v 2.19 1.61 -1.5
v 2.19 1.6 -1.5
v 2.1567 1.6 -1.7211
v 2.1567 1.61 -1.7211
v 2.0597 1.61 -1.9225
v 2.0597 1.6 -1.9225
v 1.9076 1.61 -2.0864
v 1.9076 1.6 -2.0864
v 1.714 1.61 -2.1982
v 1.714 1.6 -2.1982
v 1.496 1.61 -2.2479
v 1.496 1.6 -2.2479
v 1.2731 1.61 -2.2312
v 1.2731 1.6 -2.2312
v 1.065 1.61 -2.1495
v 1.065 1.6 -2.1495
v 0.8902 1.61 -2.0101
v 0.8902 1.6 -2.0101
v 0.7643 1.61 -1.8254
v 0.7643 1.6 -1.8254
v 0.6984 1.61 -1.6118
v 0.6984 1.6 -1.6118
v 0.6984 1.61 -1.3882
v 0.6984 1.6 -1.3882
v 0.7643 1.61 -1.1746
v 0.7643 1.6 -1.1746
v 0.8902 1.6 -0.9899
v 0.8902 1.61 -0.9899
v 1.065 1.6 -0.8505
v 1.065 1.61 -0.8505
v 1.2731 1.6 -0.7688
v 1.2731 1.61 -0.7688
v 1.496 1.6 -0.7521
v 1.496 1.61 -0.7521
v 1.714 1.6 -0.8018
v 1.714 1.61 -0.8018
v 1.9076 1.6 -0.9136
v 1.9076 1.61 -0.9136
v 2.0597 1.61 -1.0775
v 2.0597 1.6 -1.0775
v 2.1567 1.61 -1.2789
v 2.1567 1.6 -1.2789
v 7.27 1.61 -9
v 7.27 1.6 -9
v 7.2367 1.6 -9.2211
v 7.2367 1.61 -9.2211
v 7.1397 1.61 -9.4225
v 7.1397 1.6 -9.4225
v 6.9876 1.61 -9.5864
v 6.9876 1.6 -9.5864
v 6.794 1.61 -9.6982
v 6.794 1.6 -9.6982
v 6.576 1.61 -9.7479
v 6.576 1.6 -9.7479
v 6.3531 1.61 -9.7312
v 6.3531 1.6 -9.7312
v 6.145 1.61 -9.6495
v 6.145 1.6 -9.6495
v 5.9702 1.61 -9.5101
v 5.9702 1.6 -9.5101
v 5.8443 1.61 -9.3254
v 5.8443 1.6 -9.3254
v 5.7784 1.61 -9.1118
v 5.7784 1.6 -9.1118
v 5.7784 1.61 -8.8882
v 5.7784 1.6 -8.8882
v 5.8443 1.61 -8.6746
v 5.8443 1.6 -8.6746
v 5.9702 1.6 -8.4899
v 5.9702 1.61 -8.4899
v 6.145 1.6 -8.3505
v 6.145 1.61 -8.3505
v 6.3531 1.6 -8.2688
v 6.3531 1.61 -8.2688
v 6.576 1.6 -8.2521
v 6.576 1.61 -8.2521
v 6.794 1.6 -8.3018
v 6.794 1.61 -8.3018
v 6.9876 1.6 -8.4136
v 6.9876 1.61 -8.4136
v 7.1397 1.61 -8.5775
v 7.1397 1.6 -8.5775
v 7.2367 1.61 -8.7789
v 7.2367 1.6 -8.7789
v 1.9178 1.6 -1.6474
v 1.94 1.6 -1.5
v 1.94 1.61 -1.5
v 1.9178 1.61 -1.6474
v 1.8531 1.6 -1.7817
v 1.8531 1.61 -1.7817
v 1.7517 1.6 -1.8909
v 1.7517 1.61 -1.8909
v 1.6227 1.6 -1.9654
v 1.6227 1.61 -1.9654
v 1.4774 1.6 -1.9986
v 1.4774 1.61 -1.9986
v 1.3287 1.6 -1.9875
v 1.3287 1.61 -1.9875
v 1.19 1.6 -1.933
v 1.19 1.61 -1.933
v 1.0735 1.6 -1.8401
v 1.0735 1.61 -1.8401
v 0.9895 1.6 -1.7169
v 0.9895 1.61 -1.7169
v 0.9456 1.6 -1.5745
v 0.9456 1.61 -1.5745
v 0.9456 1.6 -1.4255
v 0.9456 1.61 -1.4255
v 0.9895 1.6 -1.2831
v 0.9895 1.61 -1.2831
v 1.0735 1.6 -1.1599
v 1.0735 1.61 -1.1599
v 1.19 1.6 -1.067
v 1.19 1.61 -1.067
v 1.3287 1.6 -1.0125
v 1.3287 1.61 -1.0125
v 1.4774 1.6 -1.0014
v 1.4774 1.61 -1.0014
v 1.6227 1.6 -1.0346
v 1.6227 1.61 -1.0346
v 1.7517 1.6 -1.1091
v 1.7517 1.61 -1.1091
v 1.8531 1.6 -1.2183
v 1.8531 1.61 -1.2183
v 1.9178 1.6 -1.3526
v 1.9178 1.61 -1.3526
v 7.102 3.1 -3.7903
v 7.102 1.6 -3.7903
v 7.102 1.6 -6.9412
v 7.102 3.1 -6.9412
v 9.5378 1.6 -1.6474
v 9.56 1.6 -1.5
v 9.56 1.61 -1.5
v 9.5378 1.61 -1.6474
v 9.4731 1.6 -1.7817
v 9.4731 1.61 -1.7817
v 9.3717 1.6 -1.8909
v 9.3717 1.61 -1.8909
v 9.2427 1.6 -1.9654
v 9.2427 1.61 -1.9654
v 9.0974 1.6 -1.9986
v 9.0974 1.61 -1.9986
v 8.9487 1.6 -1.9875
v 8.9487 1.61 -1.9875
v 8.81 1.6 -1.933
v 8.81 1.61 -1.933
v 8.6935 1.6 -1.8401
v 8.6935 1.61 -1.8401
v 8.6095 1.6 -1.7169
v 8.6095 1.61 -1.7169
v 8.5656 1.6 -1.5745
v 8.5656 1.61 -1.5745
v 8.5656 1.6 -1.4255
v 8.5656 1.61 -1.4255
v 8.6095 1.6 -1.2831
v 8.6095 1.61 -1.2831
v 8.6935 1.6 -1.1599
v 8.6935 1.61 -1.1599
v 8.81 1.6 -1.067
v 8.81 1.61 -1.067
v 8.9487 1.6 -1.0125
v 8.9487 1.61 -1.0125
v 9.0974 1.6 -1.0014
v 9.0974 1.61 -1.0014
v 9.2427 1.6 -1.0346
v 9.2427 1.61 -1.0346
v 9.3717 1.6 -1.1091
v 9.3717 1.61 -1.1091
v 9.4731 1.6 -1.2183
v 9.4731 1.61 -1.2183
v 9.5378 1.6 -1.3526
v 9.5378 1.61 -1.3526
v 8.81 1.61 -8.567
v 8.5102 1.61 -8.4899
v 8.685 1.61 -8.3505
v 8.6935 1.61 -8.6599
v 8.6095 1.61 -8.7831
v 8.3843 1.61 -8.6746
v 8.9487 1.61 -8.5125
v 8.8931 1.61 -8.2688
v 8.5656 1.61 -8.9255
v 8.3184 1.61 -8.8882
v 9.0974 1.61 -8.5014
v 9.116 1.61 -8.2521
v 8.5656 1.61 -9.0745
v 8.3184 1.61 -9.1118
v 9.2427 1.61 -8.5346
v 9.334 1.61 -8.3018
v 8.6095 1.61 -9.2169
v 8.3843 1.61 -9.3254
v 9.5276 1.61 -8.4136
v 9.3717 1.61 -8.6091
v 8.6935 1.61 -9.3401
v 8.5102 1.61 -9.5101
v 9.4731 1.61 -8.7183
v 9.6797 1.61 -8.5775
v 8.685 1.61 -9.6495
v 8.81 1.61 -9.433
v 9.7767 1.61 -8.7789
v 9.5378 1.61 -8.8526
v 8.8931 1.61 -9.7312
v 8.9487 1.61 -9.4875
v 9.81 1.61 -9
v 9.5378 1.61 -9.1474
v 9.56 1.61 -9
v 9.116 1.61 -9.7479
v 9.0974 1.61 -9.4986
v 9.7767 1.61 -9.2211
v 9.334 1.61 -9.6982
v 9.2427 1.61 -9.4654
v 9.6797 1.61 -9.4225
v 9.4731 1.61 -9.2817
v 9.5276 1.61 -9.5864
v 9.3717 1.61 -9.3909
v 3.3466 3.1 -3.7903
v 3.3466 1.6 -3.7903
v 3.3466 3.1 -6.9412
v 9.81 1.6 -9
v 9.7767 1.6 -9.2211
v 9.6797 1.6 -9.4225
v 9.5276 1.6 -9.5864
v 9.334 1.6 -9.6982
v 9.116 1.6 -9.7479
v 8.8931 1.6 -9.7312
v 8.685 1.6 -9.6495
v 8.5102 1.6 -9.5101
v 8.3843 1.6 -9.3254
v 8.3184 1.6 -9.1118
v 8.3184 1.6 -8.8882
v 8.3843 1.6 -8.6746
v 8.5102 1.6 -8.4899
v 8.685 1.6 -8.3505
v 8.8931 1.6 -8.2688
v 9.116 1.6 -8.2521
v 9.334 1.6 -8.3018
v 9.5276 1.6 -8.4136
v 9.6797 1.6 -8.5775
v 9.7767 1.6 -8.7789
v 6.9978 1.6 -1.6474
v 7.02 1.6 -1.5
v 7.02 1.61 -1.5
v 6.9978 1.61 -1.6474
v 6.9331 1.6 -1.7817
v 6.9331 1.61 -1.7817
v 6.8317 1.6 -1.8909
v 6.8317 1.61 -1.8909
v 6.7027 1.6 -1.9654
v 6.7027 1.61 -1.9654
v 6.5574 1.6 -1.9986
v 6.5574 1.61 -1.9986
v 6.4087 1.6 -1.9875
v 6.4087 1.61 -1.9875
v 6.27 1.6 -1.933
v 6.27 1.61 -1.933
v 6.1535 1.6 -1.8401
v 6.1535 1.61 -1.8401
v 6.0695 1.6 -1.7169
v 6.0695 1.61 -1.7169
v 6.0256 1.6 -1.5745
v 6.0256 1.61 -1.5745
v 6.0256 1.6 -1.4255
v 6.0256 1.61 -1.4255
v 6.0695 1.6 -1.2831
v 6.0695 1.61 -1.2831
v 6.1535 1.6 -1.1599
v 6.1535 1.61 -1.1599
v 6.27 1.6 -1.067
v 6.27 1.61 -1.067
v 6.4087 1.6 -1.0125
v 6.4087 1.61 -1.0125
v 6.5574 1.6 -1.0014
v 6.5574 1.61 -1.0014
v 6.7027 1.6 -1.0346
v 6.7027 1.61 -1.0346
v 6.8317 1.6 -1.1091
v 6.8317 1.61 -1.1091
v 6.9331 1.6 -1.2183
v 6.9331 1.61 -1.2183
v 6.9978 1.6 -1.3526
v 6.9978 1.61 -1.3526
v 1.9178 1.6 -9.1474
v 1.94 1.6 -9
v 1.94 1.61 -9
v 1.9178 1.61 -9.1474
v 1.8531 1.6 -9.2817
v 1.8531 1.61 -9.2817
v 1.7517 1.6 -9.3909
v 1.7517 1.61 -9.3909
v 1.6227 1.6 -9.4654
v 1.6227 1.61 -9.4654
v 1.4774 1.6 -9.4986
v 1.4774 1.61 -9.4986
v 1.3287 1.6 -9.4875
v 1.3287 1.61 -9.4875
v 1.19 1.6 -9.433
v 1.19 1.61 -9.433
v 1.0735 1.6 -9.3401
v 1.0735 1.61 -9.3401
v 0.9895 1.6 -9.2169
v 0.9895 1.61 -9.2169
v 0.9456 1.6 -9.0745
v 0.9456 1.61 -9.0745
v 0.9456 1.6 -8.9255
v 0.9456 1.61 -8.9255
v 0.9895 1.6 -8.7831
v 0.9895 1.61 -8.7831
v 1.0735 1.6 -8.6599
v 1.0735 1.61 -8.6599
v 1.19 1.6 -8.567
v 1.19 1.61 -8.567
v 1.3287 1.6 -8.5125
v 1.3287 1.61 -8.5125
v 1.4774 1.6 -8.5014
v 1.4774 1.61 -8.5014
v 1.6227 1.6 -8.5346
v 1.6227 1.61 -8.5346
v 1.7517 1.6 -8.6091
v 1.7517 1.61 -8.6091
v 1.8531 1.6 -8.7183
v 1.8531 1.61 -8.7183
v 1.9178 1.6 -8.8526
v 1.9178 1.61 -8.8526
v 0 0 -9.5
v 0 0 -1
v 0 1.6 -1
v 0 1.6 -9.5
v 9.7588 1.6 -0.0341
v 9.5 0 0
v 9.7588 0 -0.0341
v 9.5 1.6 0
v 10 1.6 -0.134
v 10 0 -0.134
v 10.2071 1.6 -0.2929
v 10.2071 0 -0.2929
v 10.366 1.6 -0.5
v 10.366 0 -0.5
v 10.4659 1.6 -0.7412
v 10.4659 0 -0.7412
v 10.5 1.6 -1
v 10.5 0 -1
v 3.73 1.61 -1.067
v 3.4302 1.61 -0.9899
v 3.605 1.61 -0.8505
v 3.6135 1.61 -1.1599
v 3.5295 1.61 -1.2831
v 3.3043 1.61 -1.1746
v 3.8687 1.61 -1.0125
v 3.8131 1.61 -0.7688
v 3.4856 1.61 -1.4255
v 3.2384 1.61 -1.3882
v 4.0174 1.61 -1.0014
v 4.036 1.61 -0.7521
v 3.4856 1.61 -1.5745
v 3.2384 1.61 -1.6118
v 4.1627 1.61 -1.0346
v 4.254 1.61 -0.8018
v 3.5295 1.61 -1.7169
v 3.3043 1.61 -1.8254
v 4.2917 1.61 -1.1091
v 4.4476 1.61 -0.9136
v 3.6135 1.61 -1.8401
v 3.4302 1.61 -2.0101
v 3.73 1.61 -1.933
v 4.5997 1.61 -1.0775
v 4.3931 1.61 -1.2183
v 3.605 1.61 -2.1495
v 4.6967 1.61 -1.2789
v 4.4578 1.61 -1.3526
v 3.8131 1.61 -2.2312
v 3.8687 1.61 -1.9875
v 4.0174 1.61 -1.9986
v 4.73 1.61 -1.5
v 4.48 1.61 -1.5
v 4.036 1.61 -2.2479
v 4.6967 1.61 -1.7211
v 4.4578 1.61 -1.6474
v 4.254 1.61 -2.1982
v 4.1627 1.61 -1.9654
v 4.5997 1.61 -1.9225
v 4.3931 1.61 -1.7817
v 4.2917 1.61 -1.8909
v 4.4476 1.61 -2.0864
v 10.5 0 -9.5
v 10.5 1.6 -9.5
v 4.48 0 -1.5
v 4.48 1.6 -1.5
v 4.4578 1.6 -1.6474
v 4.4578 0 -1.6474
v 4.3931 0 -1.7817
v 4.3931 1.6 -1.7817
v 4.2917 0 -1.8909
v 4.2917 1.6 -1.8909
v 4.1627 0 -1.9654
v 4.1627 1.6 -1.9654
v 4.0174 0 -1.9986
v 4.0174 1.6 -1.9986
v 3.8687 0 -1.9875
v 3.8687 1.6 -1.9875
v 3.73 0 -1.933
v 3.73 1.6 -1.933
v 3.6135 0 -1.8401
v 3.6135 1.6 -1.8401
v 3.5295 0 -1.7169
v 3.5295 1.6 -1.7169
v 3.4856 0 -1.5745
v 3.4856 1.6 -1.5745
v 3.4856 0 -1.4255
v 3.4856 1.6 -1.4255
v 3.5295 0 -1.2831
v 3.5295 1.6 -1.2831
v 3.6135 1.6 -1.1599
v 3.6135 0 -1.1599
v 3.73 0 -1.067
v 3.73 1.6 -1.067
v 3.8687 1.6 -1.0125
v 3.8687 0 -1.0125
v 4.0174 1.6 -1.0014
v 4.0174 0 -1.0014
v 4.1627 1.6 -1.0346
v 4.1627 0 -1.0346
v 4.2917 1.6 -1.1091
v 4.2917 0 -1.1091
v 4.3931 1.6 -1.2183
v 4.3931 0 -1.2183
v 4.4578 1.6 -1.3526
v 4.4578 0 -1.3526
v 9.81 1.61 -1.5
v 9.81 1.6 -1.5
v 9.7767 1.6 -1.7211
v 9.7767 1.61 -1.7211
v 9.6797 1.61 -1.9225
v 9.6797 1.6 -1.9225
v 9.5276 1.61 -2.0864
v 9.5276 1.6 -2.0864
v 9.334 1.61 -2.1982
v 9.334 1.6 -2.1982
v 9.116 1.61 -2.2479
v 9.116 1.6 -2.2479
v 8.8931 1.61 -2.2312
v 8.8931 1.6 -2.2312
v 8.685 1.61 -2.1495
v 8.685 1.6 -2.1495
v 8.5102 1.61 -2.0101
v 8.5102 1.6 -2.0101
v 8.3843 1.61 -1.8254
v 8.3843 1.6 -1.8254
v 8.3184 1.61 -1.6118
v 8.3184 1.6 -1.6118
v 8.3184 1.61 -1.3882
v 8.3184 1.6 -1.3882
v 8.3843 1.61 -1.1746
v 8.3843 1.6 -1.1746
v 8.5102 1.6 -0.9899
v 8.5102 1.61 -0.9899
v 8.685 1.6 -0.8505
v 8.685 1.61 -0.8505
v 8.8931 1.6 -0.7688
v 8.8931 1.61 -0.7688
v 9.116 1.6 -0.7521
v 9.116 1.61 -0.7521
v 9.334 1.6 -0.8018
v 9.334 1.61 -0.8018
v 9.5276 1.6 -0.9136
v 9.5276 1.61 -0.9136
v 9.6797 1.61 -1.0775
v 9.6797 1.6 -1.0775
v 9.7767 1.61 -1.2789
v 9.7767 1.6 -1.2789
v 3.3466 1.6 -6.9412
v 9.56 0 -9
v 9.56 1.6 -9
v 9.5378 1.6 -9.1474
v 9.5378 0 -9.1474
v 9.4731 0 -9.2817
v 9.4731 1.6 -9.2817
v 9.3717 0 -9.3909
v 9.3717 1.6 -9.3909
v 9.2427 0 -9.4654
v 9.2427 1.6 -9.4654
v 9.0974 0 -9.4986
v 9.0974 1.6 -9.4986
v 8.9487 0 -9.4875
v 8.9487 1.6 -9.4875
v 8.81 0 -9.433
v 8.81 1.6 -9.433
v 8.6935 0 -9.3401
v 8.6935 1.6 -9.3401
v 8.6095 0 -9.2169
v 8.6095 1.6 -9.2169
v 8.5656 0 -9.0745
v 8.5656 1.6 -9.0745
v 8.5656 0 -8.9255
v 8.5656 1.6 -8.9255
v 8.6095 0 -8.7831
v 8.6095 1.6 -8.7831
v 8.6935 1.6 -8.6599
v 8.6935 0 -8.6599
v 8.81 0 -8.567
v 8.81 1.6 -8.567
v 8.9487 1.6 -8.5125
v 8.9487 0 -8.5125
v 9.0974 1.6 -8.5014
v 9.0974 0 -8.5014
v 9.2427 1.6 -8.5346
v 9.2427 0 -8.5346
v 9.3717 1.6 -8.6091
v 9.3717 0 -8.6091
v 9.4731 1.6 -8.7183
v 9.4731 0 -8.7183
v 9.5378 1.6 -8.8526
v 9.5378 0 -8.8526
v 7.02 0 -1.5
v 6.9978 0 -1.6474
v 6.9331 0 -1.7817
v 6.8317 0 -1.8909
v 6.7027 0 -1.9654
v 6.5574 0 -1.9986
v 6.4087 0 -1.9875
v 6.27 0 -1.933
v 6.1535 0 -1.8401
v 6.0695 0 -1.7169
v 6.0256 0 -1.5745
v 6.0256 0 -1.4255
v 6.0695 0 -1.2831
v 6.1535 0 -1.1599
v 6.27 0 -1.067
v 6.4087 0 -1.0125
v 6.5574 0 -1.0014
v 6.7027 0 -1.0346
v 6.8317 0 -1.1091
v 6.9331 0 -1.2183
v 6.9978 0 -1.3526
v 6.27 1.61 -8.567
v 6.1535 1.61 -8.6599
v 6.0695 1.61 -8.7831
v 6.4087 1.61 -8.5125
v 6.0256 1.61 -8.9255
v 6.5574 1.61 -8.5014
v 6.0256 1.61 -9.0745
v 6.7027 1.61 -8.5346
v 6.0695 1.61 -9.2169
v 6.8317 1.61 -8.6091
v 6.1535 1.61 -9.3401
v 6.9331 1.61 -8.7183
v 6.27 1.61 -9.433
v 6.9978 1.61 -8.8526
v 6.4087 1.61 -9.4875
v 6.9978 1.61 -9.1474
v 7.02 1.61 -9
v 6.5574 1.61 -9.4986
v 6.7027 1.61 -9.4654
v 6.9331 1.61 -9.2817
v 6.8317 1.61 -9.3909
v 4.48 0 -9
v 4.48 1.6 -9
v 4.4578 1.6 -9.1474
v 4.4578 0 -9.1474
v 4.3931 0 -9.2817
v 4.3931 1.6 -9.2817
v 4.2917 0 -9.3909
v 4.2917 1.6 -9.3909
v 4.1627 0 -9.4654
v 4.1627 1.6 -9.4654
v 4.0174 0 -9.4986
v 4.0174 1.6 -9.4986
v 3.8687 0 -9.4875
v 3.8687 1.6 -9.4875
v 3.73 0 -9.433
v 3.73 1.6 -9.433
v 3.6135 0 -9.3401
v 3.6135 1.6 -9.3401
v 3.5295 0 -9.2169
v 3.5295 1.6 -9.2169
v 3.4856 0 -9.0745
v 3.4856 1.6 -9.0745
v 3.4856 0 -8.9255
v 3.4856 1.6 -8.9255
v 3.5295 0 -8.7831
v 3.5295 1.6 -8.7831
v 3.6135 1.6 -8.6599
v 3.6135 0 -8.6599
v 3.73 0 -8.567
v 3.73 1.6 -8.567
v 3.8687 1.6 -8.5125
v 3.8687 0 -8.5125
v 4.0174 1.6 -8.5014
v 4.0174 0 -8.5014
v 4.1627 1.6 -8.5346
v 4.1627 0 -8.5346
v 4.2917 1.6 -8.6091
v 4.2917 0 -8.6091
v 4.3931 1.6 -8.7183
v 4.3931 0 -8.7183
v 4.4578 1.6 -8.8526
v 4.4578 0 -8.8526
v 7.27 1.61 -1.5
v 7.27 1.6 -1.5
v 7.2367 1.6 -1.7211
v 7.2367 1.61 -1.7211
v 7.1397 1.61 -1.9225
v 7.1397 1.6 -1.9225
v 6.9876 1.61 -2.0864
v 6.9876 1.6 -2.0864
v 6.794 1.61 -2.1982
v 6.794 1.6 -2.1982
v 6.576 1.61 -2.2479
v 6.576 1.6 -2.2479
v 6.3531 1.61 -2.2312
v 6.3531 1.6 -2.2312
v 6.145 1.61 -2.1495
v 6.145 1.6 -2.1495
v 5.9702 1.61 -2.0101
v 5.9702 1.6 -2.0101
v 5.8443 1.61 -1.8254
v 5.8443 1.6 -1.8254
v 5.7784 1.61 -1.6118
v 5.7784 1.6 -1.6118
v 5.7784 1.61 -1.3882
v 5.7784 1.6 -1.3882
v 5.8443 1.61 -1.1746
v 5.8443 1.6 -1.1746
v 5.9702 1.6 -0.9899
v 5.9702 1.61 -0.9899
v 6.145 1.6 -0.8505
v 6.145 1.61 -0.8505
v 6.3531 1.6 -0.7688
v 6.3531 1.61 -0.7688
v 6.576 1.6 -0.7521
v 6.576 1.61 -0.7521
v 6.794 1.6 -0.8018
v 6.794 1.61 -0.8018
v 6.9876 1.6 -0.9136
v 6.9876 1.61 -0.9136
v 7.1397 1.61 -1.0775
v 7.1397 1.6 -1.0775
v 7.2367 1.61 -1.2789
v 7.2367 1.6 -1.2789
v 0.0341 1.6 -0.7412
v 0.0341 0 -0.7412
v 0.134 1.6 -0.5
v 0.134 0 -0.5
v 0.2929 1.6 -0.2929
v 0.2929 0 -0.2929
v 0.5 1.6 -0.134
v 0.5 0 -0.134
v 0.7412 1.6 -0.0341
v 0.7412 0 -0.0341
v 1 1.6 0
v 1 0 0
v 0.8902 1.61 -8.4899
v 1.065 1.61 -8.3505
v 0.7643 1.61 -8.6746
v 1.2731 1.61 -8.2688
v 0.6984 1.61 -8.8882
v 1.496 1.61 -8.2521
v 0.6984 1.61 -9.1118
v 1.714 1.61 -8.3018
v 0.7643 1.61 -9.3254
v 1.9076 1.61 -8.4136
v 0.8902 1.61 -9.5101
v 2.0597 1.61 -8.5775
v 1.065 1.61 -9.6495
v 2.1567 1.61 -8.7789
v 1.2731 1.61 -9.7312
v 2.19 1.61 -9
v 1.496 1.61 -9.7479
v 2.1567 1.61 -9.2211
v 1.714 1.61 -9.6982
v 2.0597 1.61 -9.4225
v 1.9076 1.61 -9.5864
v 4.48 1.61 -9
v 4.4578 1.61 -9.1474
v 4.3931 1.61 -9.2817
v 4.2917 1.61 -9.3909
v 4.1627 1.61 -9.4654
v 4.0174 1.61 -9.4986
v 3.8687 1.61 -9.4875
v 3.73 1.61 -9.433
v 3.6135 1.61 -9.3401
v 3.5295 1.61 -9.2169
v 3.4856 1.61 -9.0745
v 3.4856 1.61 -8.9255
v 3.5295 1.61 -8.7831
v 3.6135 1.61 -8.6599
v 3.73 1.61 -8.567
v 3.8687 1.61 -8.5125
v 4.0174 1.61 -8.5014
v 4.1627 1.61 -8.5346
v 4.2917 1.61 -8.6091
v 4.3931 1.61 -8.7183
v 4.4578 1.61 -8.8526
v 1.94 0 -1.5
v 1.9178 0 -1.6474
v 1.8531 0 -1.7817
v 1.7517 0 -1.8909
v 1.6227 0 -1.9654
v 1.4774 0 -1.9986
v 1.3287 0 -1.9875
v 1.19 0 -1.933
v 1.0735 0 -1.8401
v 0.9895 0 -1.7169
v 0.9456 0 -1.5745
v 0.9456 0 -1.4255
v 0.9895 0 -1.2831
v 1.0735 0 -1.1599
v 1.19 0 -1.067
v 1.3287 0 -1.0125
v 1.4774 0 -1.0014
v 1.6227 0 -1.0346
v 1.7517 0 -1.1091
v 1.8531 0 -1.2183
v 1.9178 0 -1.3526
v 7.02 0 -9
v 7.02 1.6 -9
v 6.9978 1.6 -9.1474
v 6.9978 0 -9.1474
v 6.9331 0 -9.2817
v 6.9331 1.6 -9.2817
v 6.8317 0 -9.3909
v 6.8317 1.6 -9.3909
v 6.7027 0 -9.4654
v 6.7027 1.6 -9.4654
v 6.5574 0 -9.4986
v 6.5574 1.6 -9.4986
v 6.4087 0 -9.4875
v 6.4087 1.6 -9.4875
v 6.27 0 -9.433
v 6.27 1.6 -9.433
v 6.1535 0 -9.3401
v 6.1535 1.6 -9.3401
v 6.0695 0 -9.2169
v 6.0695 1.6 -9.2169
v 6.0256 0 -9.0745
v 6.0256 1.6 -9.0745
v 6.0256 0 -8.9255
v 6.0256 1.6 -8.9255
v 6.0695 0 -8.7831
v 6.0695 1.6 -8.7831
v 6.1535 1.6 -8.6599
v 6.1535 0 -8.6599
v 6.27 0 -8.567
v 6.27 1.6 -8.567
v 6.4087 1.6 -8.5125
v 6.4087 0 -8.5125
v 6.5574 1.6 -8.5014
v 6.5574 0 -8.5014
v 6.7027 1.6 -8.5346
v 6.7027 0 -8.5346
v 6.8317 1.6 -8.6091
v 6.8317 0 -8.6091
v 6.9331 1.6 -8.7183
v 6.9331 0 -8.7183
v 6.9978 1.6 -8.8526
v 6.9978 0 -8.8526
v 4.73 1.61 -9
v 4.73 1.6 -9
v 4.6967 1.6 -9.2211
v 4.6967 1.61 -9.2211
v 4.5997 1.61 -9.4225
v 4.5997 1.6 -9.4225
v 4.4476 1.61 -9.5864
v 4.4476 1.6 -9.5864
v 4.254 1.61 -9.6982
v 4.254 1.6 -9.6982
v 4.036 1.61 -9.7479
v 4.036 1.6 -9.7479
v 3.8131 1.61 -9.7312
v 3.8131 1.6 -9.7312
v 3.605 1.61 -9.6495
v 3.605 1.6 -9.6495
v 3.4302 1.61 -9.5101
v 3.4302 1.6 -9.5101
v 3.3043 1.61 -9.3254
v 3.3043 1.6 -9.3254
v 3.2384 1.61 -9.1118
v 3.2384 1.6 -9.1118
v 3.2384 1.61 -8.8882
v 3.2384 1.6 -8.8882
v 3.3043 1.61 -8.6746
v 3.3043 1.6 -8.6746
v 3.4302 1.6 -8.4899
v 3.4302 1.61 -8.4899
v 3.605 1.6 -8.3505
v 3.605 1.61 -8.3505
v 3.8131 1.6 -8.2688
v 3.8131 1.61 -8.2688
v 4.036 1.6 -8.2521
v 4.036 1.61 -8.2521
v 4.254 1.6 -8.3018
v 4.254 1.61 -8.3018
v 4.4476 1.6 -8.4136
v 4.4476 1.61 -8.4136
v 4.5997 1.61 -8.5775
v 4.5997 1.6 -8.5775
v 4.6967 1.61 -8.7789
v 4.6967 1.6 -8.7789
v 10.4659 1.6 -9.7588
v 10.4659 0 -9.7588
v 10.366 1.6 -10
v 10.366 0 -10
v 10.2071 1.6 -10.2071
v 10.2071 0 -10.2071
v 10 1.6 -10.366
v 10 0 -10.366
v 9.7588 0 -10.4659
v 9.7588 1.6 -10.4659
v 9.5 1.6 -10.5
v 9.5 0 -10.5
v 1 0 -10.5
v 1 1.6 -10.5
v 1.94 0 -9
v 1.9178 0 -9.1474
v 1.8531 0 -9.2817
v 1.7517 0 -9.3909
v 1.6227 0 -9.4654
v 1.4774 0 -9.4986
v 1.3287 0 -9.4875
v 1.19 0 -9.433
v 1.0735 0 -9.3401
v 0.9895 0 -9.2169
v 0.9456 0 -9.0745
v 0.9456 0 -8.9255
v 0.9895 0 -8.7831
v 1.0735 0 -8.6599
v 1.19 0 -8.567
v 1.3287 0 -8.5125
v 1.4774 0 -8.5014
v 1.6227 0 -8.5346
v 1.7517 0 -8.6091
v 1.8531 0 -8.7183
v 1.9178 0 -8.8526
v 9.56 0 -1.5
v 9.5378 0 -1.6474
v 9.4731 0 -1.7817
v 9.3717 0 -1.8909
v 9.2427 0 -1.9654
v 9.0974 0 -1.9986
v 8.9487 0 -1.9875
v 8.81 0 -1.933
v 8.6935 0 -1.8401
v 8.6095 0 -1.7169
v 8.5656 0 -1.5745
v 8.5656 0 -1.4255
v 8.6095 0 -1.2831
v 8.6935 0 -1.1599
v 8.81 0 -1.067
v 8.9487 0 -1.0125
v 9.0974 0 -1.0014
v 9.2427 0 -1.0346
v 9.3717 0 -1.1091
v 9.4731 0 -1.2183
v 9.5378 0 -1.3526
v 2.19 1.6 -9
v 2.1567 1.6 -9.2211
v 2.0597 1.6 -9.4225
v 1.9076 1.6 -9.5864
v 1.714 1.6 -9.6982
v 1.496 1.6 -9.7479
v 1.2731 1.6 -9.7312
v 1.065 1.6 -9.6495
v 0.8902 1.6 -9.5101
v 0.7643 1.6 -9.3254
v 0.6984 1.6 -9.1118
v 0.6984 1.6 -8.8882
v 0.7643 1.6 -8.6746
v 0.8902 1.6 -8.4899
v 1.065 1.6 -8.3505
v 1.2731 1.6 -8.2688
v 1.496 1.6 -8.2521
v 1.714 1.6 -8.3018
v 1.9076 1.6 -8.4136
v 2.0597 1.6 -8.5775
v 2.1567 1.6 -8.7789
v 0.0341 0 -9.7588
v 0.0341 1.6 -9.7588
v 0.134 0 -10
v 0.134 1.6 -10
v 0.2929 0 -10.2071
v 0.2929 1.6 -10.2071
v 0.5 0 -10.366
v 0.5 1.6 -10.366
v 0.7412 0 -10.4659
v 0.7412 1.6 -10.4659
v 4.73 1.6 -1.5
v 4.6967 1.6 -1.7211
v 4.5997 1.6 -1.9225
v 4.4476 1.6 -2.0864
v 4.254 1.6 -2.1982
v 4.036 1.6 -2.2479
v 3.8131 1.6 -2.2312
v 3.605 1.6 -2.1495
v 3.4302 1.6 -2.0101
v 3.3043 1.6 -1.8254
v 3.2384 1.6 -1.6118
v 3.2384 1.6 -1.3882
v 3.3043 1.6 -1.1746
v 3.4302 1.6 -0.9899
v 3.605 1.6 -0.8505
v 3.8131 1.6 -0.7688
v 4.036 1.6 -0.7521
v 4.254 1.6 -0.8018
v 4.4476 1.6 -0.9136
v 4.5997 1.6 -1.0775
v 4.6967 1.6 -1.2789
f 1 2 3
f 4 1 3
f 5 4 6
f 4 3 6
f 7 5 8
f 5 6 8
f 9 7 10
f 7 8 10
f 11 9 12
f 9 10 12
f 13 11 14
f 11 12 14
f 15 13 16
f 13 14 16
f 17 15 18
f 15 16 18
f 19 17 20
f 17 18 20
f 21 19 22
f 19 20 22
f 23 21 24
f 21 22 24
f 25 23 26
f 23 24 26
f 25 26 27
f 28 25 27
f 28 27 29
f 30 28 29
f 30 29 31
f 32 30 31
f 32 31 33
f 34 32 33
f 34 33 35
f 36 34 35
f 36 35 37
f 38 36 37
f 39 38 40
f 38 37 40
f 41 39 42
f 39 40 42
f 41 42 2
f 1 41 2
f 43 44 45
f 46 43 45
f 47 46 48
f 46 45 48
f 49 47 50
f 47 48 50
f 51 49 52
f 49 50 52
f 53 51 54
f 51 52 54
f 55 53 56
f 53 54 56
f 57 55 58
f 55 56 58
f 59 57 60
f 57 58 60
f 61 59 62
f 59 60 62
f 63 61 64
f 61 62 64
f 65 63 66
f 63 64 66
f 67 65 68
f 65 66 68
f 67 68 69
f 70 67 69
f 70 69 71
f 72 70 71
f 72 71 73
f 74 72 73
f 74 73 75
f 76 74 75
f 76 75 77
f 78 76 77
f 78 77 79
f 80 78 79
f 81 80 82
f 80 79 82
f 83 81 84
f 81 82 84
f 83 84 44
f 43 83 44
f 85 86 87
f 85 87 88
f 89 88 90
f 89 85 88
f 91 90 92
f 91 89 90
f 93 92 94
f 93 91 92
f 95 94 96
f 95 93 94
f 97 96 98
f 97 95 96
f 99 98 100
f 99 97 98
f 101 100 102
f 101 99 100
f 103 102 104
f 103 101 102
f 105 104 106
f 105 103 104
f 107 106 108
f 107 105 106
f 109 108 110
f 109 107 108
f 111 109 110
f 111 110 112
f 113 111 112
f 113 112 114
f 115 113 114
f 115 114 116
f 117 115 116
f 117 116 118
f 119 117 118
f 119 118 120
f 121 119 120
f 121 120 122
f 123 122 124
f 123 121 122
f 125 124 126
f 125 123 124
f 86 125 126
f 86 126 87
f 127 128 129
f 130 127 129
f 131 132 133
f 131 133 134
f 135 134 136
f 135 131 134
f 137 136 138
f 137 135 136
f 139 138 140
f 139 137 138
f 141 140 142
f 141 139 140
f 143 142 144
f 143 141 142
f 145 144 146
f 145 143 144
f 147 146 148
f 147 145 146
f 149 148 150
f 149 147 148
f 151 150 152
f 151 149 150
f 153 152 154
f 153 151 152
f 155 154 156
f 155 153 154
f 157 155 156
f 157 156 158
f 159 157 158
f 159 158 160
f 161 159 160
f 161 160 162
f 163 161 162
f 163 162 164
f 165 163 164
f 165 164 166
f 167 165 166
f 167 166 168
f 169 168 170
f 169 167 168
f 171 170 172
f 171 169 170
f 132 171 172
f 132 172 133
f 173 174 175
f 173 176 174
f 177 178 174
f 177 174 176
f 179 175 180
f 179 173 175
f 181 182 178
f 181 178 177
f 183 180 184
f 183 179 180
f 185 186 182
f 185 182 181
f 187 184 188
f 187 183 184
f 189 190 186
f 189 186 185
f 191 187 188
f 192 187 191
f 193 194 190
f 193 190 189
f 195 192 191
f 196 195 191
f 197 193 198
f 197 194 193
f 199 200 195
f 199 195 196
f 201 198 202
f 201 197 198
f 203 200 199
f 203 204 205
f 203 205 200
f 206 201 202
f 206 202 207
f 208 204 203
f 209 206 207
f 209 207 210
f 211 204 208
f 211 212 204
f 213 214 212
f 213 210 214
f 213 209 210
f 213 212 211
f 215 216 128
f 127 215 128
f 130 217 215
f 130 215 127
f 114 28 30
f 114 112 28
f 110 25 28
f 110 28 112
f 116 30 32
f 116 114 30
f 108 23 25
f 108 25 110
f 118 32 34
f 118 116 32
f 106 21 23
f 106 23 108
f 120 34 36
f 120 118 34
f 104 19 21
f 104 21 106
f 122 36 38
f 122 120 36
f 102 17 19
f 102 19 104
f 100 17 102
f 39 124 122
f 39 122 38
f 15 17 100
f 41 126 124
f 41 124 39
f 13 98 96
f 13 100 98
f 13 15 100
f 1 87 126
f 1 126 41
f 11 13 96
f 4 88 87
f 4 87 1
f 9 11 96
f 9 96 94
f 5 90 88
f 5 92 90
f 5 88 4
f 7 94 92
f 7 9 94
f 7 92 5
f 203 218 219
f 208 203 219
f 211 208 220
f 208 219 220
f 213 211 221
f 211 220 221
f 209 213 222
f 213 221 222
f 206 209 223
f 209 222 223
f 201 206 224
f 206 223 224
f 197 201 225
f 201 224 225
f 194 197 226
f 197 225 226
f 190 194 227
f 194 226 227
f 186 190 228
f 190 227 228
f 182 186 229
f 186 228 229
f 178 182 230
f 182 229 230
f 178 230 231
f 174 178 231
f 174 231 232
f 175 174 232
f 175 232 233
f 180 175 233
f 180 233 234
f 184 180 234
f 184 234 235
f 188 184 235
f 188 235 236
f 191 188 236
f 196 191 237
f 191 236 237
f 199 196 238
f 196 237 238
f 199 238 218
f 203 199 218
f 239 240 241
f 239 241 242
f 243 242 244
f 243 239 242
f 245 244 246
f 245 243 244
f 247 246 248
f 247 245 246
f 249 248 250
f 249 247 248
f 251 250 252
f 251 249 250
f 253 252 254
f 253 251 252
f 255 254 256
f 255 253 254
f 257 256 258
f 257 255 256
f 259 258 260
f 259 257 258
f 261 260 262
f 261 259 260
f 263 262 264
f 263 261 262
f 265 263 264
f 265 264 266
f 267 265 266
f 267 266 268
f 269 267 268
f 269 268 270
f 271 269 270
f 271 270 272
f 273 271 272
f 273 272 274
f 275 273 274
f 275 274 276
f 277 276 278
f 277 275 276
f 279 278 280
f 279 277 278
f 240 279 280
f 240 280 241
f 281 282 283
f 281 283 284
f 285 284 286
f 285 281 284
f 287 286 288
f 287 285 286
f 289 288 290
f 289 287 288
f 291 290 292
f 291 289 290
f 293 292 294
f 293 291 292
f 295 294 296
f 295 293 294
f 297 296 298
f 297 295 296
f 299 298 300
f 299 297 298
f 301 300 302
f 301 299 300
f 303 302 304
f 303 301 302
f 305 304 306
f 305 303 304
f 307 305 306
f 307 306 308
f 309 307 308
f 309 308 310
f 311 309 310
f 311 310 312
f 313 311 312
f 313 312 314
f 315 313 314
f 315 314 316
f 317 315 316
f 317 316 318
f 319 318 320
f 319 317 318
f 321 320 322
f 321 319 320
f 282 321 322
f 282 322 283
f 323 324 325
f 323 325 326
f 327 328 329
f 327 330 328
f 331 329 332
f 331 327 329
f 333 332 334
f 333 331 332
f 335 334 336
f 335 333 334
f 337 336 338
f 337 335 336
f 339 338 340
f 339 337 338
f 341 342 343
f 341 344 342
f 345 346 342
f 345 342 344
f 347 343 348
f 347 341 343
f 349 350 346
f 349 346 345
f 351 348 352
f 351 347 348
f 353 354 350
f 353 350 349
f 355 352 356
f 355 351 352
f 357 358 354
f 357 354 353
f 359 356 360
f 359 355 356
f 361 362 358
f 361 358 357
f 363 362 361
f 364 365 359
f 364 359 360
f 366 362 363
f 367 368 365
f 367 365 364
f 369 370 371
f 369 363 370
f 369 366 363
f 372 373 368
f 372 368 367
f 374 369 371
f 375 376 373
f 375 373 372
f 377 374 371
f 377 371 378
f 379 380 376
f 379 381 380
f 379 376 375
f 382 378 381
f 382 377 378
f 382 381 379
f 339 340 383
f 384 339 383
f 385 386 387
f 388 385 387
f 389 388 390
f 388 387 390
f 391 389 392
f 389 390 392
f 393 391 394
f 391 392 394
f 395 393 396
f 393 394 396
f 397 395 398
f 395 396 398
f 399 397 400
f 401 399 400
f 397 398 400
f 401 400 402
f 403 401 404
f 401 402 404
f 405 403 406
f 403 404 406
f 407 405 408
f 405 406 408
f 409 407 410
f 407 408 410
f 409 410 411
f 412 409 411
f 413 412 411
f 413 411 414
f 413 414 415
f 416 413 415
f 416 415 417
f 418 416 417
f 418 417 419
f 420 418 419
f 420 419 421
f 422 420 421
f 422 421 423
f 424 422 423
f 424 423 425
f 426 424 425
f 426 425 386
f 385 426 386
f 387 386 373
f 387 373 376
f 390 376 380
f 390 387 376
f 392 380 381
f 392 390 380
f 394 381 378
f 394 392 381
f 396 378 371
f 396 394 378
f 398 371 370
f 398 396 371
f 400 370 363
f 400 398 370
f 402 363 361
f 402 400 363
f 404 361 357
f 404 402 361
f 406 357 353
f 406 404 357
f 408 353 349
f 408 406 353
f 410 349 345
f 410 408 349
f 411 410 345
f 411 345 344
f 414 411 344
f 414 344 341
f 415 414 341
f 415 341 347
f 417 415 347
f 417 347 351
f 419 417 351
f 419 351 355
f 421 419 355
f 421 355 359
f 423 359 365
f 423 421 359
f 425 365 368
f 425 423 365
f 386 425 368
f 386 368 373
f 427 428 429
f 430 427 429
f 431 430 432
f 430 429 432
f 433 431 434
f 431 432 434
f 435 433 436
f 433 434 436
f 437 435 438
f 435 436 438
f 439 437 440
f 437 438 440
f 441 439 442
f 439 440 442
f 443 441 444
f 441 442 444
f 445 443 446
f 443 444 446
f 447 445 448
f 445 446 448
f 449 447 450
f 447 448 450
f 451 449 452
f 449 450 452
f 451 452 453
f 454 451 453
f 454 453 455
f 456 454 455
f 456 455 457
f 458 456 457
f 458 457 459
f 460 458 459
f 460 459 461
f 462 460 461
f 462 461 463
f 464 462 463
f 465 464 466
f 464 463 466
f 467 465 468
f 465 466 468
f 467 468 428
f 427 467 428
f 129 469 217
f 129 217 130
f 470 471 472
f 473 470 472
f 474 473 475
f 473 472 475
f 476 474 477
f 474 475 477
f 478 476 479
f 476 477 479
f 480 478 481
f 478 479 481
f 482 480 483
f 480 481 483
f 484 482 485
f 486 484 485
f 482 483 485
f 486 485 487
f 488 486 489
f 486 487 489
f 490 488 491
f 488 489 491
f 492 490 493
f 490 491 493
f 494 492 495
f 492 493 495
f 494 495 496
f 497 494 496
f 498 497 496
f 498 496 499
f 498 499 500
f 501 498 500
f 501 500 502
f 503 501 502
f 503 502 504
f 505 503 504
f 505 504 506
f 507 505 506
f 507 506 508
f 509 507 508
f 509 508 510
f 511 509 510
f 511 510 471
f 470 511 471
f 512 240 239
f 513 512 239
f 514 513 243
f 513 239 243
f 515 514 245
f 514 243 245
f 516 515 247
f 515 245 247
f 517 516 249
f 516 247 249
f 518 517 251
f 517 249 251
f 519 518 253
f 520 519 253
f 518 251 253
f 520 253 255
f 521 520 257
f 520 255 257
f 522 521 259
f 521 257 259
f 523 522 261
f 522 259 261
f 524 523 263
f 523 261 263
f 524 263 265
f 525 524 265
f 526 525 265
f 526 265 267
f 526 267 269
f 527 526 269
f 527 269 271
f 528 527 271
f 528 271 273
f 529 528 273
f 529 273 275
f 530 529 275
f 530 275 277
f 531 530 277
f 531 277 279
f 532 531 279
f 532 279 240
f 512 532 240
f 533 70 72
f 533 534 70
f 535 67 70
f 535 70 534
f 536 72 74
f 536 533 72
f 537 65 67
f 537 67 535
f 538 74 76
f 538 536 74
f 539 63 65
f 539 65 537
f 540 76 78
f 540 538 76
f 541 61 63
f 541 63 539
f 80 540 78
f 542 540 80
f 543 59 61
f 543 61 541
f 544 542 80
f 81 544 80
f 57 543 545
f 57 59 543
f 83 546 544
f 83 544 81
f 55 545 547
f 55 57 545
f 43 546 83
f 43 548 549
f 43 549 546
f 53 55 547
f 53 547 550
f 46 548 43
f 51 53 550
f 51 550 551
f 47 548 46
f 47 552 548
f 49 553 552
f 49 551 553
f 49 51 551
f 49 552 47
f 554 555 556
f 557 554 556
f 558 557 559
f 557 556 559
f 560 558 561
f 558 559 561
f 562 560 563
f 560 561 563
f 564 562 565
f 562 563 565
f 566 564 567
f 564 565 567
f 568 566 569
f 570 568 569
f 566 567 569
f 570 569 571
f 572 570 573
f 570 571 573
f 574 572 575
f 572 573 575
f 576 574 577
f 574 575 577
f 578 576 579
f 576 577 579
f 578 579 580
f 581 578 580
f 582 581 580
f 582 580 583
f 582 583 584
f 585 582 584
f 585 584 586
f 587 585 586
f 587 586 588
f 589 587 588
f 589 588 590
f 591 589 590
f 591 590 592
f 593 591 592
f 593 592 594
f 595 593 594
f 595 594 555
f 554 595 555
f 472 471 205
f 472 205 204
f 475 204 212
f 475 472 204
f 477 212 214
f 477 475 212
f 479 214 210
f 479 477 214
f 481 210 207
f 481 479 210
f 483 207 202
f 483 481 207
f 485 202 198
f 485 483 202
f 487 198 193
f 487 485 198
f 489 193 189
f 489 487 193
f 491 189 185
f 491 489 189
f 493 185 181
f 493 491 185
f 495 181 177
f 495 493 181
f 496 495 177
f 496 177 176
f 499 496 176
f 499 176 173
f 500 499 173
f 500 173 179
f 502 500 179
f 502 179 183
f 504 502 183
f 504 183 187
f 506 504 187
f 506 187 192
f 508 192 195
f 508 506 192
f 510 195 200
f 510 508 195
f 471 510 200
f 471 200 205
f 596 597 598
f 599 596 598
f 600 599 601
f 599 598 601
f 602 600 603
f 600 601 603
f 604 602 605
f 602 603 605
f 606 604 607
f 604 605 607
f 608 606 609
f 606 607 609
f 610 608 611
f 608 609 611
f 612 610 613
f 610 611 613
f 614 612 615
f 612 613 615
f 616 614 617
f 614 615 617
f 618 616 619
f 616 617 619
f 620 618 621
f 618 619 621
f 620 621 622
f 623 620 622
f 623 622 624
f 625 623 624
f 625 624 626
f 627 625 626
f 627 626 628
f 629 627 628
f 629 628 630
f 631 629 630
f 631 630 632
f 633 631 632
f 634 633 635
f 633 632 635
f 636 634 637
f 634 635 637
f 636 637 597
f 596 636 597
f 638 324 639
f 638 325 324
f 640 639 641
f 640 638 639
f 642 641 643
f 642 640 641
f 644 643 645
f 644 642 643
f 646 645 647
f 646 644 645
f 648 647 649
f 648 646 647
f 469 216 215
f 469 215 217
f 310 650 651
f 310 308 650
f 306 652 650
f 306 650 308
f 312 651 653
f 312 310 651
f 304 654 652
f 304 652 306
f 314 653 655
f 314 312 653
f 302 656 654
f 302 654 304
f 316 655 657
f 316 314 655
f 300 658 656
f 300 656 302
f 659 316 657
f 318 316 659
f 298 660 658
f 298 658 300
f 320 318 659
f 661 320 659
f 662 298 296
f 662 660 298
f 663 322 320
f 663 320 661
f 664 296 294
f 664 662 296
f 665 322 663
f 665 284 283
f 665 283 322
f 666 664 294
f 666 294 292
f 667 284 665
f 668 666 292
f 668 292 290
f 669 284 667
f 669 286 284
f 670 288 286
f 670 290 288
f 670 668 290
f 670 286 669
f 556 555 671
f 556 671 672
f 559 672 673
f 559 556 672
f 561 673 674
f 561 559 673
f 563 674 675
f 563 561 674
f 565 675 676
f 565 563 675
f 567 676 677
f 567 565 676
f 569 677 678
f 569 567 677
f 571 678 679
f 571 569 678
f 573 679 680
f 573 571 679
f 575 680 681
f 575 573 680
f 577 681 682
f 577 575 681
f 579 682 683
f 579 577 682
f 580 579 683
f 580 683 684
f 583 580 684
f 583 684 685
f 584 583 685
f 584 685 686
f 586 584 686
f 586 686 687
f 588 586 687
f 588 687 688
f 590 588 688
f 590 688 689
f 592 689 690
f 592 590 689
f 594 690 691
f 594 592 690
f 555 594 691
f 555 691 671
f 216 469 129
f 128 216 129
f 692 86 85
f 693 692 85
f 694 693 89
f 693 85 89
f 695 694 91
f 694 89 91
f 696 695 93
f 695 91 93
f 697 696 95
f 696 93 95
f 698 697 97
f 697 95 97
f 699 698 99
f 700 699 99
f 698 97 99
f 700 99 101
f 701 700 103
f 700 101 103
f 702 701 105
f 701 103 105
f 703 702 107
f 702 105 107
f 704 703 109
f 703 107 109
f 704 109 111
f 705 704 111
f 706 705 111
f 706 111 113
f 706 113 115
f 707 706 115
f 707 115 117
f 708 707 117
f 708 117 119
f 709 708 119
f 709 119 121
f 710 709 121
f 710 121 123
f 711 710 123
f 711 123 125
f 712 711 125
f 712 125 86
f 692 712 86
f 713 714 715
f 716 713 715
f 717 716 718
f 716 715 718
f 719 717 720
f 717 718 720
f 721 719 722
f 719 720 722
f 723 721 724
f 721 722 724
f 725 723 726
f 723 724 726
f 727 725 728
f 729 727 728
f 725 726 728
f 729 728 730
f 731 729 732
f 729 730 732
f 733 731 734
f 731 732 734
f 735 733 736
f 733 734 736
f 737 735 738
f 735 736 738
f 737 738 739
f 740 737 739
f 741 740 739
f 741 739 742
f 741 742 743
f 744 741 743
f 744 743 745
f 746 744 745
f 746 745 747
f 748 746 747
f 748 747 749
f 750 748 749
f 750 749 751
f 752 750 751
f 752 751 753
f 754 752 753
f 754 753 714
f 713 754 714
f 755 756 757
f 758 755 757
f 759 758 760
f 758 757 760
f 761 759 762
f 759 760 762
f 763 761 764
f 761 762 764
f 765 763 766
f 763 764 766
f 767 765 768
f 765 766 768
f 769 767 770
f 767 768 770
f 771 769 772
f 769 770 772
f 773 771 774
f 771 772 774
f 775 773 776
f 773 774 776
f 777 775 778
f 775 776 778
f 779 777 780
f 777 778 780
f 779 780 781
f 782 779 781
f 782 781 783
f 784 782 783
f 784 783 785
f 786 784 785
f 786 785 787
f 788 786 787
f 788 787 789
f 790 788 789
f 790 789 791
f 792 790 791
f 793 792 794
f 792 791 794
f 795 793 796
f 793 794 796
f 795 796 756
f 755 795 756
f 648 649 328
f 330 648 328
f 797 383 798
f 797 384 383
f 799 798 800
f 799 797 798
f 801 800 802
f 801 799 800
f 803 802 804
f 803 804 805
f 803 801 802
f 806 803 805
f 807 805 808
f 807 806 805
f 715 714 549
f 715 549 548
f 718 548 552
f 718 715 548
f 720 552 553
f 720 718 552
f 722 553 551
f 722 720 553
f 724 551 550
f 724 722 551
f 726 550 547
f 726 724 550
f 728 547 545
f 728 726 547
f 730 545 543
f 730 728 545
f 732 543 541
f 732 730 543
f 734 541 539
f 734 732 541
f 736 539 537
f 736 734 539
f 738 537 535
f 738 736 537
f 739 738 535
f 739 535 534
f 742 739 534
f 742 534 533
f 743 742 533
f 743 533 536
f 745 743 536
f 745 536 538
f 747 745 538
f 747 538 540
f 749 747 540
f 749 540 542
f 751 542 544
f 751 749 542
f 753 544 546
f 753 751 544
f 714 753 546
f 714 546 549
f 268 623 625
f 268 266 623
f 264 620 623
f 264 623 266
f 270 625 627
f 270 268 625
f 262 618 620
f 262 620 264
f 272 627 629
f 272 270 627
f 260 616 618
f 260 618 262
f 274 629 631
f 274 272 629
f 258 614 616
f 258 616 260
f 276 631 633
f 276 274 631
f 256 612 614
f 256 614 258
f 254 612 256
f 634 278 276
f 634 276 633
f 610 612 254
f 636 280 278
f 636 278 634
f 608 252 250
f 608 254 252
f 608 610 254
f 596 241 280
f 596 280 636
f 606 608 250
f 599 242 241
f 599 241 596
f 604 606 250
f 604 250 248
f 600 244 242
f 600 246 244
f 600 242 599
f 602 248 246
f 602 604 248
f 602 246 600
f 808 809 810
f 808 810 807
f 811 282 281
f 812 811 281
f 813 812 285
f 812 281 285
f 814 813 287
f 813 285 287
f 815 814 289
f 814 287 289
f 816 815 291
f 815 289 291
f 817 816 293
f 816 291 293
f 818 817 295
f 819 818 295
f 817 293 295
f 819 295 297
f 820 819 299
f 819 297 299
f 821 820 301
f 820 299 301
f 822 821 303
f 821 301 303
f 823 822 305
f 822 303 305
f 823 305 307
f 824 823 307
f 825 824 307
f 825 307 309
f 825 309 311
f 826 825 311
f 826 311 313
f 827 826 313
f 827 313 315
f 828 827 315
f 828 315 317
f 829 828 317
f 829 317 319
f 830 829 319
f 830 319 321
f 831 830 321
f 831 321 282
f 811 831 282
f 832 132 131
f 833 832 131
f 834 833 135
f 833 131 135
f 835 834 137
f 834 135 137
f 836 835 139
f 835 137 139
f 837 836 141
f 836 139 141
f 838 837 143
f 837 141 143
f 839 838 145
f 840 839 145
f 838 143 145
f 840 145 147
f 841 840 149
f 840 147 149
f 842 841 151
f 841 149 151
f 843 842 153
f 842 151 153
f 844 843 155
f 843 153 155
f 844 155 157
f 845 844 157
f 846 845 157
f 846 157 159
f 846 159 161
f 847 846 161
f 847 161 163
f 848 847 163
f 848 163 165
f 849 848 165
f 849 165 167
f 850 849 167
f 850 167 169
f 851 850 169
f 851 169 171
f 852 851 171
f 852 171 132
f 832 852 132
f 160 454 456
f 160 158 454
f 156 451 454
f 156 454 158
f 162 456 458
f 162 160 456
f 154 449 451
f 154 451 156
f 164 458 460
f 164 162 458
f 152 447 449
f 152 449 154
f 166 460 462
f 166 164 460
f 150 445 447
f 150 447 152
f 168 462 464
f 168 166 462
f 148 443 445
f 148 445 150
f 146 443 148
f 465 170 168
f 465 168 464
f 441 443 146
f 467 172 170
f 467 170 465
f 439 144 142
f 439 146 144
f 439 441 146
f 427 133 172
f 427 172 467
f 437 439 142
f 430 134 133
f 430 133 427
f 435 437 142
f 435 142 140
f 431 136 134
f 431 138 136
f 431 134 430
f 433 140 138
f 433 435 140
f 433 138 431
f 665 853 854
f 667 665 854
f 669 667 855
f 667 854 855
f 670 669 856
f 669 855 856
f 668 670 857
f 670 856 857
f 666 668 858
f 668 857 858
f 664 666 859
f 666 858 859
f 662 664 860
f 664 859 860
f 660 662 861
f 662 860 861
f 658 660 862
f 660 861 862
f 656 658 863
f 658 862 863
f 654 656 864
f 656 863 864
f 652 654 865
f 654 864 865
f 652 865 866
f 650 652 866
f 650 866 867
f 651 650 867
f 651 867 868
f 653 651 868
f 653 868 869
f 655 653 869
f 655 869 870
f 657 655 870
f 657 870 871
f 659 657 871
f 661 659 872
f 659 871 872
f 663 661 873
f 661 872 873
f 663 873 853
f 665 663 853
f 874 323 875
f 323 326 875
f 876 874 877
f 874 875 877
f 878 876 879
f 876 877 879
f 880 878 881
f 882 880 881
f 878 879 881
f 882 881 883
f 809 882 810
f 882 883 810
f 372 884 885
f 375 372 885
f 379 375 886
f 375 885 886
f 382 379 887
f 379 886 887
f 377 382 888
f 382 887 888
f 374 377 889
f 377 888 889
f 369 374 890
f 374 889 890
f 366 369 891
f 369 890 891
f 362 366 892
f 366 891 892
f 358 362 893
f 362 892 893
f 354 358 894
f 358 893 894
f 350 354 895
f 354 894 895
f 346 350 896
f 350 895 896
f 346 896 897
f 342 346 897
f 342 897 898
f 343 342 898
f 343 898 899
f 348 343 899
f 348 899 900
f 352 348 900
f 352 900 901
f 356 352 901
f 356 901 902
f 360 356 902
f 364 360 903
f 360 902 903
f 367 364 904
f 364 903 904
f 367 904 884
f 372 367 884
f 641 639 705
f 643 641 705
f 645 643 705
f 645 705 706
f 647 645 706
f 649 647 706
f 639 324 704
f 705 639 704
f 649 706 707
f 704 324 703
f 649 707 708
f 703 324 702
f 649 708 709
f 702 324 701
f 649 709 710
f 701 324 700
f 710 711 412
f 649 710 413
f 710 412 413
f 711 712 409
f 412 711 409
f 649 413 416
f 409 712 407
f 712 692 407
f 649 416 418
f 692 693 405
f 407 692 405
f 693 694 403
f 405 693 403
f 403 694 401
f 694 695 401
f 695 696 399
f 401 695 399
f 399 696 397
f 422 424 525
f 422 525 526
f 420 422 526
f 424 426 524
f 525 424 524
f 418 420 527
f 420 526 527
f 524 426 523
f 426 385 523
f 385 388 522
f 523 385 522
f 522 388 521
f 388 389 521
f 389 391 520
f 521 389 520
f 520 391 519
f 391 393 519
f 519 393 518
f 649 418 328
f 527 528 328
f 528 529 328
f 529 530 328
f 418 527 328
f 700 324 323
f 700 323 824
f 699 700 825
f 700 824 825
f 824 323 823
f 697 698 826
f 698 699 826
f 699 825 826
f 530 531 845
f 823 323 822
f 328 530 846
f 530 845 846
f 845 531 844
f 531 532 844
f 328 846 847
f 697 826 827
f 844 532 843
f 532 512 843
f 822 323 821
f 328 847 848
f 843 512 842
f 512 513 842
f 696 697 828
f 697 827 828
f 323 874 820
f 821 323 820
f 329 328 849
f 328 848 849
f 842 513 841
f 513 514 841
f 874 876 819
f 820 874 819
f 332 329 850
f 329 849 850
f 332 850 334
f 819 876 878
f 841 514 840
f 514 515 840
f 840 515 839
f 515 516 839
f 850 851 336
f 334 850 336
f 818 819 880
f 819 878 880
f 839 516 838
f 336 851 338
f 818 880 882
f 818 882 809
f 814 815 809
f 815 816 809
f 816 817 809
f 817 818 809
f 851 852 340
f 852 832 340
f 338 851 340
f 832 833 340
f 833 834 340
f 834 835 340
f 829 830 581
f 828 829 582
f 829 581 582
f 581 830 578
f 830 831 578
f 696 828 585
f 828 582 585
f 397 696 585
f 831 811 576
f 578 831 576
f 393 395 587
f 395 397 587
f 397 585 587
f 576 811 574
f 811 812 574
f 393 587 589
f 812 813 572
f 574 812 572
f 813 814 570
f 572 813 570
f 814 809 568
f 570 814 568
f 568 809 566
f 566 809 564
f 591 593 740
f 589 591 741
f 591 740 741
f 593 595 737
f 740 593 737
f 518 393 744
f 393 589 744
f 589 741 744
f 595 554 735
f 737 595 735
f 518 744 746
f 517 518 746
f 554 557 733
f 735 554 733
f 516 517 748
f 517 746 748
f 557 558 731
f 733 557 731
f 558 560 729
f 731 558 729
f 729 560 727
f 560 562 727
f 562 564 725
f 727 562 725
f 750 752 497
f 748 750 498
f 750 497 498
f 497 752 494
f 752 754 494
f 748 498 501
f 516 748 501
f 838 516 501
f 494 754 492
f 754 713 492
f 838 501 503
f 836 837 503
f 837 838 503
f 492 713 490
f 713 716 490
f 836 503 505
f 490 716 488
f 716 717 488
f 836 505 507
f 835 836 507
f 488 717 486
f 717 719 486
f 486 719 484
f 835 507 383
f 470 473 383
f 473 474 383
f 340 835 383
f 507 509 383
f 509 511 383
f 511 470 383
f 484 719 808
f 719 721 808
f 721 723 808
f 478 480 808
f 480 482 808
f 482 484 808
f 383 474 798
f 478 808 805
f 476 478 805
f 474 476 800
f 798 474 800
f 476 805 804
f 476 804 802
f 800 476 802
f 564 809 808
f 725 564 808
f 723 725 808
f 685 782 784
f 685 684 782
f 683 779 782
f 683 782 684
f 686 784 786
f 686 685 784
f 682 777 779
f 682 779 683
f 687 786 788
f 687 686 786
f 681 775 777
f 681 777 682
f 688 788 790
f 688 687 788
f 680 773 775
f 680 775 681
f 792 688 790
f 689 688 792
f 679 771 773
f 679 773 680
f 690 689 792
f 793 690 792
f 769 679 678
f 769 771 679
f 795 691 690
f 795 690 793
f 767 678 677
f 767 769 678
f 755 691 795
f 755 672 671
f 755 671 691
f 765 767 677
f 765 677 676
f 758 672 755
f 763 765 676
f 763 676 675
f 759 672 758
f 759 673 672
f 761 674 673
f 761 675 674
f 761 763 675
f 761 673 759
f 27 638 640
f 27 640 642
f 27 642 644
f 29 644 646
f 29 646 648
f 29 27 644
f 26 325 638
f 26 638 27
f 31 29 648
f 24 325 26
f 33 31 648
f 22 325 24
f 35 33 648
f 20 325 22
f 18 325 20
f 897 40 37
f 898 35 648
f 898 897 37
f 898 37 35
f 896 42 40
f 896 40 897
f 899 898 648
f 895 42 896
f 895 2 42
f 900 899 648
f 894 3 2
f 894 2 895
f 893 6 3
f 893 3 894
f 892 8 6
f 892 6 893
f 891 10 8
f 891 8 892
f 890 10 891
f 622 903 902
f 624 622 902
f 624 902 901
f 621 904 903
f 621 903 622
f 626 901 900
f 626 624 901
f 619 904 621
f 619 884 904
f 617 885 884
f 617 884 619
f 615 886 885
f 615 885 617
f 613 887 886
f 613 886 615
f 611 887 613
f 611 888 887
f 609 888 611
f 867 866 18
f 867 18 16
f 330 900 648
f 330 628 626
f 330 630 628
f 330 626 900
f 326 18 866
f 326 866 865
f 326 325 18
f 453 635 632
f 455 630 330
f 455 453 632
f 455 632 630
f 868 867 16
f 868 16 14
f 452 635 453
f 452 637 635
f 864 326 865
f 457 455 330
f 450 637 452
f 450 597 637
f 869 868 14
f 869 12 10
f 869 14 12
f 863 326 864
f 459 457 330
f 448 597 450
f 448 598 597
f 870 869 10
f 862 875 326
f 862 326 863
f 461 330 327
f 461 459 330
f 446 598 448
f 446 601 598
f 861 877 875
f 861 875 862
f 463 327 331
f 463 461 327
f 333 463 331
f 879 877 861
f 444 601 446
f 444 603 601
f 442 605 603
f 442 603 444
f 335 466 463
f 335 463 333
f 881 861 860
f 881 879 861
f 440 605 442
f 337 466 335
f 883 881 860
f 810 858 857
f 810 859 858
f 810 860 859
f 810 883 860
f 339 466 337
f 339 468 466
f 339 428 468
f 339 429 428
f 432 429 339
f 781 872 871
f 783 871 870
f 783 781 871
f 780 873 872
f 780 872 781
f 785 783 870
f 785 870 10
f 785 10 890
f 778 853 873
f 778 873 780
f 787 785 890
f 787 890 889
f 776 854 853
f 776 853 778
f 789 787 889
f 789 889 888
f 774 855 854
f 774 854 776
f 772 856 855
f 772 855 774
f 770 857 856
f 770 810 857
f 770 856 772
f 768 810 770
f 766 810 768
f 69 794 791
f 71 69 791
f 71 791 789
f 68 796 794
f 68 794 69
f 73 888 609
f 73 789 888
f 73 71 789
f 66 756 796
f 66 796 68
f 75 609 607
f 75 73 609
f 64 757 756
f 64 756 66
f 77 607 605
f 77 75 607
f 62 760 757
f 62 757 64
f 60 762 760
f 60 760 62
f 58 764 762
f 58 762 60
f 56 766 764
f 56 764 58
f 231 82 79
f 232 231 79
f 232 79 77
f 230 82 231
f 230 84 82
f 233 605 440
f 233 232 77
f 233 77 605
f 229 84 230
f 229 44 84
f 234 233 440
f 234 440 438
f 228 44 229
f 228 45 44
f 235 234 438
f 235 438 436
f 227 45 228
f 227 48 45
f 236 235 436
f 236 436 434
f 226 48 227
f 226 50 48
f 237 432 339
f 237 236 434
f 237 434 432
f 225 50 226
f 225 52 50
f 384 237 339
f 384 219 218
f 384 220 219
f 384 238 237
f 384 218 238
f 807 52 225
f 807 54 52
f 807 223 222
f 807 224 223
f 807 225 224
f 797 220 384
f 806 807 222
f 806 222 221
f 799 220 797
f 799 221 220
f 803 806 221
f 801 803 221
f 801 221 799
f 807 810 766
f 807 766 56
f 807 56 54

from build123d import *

# Parameters (mm, degrees)
SKETCH1_W           = 10.5
SKETCH1_H           = 10.5
BOSS_EXTRUDE1_DEPTH = 1.6
FILLET1_R           = 1
SKETCH2_R           = 0.75
SKETCH2_R_2         = 0.5
BOSS_EXTRUDE2_DEPTH = 0.01
SKETCH4_R           = 0.5
CUT_EXTRUDE1_DEPTH  = 2
SKETCH5_W           = 3.755390915
SKETCH5_H           = 3.150927308
BOSS_EXTRUDE3_DEPTH = 1.5


with BuildPart() as part:
    # Sketch1 → Boss-Extrude1 (new body)
    with BuildSketch(Plane(origin=(0, 0, 0), x_dir=(1, 0, 0), z_dir=(0, 1, 0))):
        with Locations((5.25, 5.25)):
            Rectangle(SKETCH1_W, SKETCH1_H)
    extrude(amount=BOSS_EXTRUDE1_DEPTH)

    # Fillet1
    fillet1_edges = [part.edges().sort_by_distance(p)[0] for p in [
        (0, 0.8, -10.5),
        (10.5, 0.8, -10.5),
        (10.5, 0.8, 0),
        (0, 0.8, 0),
    ]]
    fillet(fillet1_edges, radius=FILLET1_R)

    # Sketch2 → Boss-Extrude2 (add)
    with BuildSketch(Plane(origin=(0, 1.6, 0), x_dir=(1, 0, 0), z_dir=(0, 1, 0))):
        with Locations((1.44, 1.5)):
            Circle(SKETCH2_R)
        with Locations((1.44, 1.5)):
            Circle(SKETCH2_R_2, mode=Mode.SUBTRACT)
        with Locations((3.98, 1.5)):
            Circle(SKETCH2_R)
        with Locations((3.98, 1.5)):
            Circle(SKETCH2_R_2, mode=Mode.SUBTRACT)
        with Locations((6.52, 1.5)):
            Circle(SKETCH2_R)
        with Locations((6.52, 1.5)):
            Circle(SKETCH2_R_2, mode=Mode.SUBTRACT)
        with Locations((9.06, 1.5)):
            Circle(SKETCH2_R)
        with Locations((9.06, 1.5)):
            Circle(SKETCH2_R_2, mode=Mode.SUBTRACT)
        with Locations((9.06, 9)):
            Circle(SKETCH2_R)
        with Locations((9.06, 9)):
            Circle(SKETCH2_R_2, mode=Mode.SUBTRACT)
        with Locations((6.52, 9)):
            Circle(SKETCH2_R)
        with Locations((6.52, 9)):
            Circle(SKETCH2_R_2, mode=Mode.SUBTRACT)
        with Locations((3.98, 9)):
            Circle(SKETCH2_R)
        with Locations((3.98, 9)):
            Circle(SKETCH2_R_2, mode=Mode.SUBTRACT)
        with Locations((1.44, 9)):
            Circle(SKETCH2_R)
        with Locations((1.44, 9)):
            Circle(SKETCH2_R_2, mode=Mode.SUBTRACT)
    extrude(amount=BOSS_EXTRUDE2_DEPTH)

    # Sketch4 → Cut-Extrude1 (cut)
    with BuildSketch(Plane(origin=(0, 1.6, 0), x_dir=(1, 0, 0), z_dir=(0, 1, 0))):
        with Locations((9.06, 1.5)):
            Circle(SKETCH4_R)
        with Locations((6.52, 1.5)):
            Circle(SKETCH4_R)
        with Locations((3.98, 1.5)):
            Circle(SKETCH4_R)
        with Locations((1.44, 1.5)):
            Circle(SKETCH4_R)
        with Locations((1.44, 9)):
            Circle(SKETCH4_R)
        with Locations((3.98, 9)):
            Circle(SKETCH4_R)
        with Locations((6.52, 9)):
            Circle(SKETCH4_R)
        with Locations((9.06, 9)):
            Circle(SKETCH4_R)
    extrude(amount=-CUT_EXTRUDE1_DEPTH, mode=Mode.SUBTRACT)


with BuildPart() as body_2:
    # Sketch5 → Boss-Extrude3 (new body)
    with BuildSketch(Plane(origin=(0, 1.6, 0), x_dir=(1, 0, 0), z_dir=(0, 1, 0))):
        with Locations((5.224278145, 5.36574835)):
            Rectangle(SKETCH5_W, SKETCH5_H)
    extrude(amount=BOSS_EXTRUDE3_DEPTH)


solid = Compound([part.part, body_2.part])
